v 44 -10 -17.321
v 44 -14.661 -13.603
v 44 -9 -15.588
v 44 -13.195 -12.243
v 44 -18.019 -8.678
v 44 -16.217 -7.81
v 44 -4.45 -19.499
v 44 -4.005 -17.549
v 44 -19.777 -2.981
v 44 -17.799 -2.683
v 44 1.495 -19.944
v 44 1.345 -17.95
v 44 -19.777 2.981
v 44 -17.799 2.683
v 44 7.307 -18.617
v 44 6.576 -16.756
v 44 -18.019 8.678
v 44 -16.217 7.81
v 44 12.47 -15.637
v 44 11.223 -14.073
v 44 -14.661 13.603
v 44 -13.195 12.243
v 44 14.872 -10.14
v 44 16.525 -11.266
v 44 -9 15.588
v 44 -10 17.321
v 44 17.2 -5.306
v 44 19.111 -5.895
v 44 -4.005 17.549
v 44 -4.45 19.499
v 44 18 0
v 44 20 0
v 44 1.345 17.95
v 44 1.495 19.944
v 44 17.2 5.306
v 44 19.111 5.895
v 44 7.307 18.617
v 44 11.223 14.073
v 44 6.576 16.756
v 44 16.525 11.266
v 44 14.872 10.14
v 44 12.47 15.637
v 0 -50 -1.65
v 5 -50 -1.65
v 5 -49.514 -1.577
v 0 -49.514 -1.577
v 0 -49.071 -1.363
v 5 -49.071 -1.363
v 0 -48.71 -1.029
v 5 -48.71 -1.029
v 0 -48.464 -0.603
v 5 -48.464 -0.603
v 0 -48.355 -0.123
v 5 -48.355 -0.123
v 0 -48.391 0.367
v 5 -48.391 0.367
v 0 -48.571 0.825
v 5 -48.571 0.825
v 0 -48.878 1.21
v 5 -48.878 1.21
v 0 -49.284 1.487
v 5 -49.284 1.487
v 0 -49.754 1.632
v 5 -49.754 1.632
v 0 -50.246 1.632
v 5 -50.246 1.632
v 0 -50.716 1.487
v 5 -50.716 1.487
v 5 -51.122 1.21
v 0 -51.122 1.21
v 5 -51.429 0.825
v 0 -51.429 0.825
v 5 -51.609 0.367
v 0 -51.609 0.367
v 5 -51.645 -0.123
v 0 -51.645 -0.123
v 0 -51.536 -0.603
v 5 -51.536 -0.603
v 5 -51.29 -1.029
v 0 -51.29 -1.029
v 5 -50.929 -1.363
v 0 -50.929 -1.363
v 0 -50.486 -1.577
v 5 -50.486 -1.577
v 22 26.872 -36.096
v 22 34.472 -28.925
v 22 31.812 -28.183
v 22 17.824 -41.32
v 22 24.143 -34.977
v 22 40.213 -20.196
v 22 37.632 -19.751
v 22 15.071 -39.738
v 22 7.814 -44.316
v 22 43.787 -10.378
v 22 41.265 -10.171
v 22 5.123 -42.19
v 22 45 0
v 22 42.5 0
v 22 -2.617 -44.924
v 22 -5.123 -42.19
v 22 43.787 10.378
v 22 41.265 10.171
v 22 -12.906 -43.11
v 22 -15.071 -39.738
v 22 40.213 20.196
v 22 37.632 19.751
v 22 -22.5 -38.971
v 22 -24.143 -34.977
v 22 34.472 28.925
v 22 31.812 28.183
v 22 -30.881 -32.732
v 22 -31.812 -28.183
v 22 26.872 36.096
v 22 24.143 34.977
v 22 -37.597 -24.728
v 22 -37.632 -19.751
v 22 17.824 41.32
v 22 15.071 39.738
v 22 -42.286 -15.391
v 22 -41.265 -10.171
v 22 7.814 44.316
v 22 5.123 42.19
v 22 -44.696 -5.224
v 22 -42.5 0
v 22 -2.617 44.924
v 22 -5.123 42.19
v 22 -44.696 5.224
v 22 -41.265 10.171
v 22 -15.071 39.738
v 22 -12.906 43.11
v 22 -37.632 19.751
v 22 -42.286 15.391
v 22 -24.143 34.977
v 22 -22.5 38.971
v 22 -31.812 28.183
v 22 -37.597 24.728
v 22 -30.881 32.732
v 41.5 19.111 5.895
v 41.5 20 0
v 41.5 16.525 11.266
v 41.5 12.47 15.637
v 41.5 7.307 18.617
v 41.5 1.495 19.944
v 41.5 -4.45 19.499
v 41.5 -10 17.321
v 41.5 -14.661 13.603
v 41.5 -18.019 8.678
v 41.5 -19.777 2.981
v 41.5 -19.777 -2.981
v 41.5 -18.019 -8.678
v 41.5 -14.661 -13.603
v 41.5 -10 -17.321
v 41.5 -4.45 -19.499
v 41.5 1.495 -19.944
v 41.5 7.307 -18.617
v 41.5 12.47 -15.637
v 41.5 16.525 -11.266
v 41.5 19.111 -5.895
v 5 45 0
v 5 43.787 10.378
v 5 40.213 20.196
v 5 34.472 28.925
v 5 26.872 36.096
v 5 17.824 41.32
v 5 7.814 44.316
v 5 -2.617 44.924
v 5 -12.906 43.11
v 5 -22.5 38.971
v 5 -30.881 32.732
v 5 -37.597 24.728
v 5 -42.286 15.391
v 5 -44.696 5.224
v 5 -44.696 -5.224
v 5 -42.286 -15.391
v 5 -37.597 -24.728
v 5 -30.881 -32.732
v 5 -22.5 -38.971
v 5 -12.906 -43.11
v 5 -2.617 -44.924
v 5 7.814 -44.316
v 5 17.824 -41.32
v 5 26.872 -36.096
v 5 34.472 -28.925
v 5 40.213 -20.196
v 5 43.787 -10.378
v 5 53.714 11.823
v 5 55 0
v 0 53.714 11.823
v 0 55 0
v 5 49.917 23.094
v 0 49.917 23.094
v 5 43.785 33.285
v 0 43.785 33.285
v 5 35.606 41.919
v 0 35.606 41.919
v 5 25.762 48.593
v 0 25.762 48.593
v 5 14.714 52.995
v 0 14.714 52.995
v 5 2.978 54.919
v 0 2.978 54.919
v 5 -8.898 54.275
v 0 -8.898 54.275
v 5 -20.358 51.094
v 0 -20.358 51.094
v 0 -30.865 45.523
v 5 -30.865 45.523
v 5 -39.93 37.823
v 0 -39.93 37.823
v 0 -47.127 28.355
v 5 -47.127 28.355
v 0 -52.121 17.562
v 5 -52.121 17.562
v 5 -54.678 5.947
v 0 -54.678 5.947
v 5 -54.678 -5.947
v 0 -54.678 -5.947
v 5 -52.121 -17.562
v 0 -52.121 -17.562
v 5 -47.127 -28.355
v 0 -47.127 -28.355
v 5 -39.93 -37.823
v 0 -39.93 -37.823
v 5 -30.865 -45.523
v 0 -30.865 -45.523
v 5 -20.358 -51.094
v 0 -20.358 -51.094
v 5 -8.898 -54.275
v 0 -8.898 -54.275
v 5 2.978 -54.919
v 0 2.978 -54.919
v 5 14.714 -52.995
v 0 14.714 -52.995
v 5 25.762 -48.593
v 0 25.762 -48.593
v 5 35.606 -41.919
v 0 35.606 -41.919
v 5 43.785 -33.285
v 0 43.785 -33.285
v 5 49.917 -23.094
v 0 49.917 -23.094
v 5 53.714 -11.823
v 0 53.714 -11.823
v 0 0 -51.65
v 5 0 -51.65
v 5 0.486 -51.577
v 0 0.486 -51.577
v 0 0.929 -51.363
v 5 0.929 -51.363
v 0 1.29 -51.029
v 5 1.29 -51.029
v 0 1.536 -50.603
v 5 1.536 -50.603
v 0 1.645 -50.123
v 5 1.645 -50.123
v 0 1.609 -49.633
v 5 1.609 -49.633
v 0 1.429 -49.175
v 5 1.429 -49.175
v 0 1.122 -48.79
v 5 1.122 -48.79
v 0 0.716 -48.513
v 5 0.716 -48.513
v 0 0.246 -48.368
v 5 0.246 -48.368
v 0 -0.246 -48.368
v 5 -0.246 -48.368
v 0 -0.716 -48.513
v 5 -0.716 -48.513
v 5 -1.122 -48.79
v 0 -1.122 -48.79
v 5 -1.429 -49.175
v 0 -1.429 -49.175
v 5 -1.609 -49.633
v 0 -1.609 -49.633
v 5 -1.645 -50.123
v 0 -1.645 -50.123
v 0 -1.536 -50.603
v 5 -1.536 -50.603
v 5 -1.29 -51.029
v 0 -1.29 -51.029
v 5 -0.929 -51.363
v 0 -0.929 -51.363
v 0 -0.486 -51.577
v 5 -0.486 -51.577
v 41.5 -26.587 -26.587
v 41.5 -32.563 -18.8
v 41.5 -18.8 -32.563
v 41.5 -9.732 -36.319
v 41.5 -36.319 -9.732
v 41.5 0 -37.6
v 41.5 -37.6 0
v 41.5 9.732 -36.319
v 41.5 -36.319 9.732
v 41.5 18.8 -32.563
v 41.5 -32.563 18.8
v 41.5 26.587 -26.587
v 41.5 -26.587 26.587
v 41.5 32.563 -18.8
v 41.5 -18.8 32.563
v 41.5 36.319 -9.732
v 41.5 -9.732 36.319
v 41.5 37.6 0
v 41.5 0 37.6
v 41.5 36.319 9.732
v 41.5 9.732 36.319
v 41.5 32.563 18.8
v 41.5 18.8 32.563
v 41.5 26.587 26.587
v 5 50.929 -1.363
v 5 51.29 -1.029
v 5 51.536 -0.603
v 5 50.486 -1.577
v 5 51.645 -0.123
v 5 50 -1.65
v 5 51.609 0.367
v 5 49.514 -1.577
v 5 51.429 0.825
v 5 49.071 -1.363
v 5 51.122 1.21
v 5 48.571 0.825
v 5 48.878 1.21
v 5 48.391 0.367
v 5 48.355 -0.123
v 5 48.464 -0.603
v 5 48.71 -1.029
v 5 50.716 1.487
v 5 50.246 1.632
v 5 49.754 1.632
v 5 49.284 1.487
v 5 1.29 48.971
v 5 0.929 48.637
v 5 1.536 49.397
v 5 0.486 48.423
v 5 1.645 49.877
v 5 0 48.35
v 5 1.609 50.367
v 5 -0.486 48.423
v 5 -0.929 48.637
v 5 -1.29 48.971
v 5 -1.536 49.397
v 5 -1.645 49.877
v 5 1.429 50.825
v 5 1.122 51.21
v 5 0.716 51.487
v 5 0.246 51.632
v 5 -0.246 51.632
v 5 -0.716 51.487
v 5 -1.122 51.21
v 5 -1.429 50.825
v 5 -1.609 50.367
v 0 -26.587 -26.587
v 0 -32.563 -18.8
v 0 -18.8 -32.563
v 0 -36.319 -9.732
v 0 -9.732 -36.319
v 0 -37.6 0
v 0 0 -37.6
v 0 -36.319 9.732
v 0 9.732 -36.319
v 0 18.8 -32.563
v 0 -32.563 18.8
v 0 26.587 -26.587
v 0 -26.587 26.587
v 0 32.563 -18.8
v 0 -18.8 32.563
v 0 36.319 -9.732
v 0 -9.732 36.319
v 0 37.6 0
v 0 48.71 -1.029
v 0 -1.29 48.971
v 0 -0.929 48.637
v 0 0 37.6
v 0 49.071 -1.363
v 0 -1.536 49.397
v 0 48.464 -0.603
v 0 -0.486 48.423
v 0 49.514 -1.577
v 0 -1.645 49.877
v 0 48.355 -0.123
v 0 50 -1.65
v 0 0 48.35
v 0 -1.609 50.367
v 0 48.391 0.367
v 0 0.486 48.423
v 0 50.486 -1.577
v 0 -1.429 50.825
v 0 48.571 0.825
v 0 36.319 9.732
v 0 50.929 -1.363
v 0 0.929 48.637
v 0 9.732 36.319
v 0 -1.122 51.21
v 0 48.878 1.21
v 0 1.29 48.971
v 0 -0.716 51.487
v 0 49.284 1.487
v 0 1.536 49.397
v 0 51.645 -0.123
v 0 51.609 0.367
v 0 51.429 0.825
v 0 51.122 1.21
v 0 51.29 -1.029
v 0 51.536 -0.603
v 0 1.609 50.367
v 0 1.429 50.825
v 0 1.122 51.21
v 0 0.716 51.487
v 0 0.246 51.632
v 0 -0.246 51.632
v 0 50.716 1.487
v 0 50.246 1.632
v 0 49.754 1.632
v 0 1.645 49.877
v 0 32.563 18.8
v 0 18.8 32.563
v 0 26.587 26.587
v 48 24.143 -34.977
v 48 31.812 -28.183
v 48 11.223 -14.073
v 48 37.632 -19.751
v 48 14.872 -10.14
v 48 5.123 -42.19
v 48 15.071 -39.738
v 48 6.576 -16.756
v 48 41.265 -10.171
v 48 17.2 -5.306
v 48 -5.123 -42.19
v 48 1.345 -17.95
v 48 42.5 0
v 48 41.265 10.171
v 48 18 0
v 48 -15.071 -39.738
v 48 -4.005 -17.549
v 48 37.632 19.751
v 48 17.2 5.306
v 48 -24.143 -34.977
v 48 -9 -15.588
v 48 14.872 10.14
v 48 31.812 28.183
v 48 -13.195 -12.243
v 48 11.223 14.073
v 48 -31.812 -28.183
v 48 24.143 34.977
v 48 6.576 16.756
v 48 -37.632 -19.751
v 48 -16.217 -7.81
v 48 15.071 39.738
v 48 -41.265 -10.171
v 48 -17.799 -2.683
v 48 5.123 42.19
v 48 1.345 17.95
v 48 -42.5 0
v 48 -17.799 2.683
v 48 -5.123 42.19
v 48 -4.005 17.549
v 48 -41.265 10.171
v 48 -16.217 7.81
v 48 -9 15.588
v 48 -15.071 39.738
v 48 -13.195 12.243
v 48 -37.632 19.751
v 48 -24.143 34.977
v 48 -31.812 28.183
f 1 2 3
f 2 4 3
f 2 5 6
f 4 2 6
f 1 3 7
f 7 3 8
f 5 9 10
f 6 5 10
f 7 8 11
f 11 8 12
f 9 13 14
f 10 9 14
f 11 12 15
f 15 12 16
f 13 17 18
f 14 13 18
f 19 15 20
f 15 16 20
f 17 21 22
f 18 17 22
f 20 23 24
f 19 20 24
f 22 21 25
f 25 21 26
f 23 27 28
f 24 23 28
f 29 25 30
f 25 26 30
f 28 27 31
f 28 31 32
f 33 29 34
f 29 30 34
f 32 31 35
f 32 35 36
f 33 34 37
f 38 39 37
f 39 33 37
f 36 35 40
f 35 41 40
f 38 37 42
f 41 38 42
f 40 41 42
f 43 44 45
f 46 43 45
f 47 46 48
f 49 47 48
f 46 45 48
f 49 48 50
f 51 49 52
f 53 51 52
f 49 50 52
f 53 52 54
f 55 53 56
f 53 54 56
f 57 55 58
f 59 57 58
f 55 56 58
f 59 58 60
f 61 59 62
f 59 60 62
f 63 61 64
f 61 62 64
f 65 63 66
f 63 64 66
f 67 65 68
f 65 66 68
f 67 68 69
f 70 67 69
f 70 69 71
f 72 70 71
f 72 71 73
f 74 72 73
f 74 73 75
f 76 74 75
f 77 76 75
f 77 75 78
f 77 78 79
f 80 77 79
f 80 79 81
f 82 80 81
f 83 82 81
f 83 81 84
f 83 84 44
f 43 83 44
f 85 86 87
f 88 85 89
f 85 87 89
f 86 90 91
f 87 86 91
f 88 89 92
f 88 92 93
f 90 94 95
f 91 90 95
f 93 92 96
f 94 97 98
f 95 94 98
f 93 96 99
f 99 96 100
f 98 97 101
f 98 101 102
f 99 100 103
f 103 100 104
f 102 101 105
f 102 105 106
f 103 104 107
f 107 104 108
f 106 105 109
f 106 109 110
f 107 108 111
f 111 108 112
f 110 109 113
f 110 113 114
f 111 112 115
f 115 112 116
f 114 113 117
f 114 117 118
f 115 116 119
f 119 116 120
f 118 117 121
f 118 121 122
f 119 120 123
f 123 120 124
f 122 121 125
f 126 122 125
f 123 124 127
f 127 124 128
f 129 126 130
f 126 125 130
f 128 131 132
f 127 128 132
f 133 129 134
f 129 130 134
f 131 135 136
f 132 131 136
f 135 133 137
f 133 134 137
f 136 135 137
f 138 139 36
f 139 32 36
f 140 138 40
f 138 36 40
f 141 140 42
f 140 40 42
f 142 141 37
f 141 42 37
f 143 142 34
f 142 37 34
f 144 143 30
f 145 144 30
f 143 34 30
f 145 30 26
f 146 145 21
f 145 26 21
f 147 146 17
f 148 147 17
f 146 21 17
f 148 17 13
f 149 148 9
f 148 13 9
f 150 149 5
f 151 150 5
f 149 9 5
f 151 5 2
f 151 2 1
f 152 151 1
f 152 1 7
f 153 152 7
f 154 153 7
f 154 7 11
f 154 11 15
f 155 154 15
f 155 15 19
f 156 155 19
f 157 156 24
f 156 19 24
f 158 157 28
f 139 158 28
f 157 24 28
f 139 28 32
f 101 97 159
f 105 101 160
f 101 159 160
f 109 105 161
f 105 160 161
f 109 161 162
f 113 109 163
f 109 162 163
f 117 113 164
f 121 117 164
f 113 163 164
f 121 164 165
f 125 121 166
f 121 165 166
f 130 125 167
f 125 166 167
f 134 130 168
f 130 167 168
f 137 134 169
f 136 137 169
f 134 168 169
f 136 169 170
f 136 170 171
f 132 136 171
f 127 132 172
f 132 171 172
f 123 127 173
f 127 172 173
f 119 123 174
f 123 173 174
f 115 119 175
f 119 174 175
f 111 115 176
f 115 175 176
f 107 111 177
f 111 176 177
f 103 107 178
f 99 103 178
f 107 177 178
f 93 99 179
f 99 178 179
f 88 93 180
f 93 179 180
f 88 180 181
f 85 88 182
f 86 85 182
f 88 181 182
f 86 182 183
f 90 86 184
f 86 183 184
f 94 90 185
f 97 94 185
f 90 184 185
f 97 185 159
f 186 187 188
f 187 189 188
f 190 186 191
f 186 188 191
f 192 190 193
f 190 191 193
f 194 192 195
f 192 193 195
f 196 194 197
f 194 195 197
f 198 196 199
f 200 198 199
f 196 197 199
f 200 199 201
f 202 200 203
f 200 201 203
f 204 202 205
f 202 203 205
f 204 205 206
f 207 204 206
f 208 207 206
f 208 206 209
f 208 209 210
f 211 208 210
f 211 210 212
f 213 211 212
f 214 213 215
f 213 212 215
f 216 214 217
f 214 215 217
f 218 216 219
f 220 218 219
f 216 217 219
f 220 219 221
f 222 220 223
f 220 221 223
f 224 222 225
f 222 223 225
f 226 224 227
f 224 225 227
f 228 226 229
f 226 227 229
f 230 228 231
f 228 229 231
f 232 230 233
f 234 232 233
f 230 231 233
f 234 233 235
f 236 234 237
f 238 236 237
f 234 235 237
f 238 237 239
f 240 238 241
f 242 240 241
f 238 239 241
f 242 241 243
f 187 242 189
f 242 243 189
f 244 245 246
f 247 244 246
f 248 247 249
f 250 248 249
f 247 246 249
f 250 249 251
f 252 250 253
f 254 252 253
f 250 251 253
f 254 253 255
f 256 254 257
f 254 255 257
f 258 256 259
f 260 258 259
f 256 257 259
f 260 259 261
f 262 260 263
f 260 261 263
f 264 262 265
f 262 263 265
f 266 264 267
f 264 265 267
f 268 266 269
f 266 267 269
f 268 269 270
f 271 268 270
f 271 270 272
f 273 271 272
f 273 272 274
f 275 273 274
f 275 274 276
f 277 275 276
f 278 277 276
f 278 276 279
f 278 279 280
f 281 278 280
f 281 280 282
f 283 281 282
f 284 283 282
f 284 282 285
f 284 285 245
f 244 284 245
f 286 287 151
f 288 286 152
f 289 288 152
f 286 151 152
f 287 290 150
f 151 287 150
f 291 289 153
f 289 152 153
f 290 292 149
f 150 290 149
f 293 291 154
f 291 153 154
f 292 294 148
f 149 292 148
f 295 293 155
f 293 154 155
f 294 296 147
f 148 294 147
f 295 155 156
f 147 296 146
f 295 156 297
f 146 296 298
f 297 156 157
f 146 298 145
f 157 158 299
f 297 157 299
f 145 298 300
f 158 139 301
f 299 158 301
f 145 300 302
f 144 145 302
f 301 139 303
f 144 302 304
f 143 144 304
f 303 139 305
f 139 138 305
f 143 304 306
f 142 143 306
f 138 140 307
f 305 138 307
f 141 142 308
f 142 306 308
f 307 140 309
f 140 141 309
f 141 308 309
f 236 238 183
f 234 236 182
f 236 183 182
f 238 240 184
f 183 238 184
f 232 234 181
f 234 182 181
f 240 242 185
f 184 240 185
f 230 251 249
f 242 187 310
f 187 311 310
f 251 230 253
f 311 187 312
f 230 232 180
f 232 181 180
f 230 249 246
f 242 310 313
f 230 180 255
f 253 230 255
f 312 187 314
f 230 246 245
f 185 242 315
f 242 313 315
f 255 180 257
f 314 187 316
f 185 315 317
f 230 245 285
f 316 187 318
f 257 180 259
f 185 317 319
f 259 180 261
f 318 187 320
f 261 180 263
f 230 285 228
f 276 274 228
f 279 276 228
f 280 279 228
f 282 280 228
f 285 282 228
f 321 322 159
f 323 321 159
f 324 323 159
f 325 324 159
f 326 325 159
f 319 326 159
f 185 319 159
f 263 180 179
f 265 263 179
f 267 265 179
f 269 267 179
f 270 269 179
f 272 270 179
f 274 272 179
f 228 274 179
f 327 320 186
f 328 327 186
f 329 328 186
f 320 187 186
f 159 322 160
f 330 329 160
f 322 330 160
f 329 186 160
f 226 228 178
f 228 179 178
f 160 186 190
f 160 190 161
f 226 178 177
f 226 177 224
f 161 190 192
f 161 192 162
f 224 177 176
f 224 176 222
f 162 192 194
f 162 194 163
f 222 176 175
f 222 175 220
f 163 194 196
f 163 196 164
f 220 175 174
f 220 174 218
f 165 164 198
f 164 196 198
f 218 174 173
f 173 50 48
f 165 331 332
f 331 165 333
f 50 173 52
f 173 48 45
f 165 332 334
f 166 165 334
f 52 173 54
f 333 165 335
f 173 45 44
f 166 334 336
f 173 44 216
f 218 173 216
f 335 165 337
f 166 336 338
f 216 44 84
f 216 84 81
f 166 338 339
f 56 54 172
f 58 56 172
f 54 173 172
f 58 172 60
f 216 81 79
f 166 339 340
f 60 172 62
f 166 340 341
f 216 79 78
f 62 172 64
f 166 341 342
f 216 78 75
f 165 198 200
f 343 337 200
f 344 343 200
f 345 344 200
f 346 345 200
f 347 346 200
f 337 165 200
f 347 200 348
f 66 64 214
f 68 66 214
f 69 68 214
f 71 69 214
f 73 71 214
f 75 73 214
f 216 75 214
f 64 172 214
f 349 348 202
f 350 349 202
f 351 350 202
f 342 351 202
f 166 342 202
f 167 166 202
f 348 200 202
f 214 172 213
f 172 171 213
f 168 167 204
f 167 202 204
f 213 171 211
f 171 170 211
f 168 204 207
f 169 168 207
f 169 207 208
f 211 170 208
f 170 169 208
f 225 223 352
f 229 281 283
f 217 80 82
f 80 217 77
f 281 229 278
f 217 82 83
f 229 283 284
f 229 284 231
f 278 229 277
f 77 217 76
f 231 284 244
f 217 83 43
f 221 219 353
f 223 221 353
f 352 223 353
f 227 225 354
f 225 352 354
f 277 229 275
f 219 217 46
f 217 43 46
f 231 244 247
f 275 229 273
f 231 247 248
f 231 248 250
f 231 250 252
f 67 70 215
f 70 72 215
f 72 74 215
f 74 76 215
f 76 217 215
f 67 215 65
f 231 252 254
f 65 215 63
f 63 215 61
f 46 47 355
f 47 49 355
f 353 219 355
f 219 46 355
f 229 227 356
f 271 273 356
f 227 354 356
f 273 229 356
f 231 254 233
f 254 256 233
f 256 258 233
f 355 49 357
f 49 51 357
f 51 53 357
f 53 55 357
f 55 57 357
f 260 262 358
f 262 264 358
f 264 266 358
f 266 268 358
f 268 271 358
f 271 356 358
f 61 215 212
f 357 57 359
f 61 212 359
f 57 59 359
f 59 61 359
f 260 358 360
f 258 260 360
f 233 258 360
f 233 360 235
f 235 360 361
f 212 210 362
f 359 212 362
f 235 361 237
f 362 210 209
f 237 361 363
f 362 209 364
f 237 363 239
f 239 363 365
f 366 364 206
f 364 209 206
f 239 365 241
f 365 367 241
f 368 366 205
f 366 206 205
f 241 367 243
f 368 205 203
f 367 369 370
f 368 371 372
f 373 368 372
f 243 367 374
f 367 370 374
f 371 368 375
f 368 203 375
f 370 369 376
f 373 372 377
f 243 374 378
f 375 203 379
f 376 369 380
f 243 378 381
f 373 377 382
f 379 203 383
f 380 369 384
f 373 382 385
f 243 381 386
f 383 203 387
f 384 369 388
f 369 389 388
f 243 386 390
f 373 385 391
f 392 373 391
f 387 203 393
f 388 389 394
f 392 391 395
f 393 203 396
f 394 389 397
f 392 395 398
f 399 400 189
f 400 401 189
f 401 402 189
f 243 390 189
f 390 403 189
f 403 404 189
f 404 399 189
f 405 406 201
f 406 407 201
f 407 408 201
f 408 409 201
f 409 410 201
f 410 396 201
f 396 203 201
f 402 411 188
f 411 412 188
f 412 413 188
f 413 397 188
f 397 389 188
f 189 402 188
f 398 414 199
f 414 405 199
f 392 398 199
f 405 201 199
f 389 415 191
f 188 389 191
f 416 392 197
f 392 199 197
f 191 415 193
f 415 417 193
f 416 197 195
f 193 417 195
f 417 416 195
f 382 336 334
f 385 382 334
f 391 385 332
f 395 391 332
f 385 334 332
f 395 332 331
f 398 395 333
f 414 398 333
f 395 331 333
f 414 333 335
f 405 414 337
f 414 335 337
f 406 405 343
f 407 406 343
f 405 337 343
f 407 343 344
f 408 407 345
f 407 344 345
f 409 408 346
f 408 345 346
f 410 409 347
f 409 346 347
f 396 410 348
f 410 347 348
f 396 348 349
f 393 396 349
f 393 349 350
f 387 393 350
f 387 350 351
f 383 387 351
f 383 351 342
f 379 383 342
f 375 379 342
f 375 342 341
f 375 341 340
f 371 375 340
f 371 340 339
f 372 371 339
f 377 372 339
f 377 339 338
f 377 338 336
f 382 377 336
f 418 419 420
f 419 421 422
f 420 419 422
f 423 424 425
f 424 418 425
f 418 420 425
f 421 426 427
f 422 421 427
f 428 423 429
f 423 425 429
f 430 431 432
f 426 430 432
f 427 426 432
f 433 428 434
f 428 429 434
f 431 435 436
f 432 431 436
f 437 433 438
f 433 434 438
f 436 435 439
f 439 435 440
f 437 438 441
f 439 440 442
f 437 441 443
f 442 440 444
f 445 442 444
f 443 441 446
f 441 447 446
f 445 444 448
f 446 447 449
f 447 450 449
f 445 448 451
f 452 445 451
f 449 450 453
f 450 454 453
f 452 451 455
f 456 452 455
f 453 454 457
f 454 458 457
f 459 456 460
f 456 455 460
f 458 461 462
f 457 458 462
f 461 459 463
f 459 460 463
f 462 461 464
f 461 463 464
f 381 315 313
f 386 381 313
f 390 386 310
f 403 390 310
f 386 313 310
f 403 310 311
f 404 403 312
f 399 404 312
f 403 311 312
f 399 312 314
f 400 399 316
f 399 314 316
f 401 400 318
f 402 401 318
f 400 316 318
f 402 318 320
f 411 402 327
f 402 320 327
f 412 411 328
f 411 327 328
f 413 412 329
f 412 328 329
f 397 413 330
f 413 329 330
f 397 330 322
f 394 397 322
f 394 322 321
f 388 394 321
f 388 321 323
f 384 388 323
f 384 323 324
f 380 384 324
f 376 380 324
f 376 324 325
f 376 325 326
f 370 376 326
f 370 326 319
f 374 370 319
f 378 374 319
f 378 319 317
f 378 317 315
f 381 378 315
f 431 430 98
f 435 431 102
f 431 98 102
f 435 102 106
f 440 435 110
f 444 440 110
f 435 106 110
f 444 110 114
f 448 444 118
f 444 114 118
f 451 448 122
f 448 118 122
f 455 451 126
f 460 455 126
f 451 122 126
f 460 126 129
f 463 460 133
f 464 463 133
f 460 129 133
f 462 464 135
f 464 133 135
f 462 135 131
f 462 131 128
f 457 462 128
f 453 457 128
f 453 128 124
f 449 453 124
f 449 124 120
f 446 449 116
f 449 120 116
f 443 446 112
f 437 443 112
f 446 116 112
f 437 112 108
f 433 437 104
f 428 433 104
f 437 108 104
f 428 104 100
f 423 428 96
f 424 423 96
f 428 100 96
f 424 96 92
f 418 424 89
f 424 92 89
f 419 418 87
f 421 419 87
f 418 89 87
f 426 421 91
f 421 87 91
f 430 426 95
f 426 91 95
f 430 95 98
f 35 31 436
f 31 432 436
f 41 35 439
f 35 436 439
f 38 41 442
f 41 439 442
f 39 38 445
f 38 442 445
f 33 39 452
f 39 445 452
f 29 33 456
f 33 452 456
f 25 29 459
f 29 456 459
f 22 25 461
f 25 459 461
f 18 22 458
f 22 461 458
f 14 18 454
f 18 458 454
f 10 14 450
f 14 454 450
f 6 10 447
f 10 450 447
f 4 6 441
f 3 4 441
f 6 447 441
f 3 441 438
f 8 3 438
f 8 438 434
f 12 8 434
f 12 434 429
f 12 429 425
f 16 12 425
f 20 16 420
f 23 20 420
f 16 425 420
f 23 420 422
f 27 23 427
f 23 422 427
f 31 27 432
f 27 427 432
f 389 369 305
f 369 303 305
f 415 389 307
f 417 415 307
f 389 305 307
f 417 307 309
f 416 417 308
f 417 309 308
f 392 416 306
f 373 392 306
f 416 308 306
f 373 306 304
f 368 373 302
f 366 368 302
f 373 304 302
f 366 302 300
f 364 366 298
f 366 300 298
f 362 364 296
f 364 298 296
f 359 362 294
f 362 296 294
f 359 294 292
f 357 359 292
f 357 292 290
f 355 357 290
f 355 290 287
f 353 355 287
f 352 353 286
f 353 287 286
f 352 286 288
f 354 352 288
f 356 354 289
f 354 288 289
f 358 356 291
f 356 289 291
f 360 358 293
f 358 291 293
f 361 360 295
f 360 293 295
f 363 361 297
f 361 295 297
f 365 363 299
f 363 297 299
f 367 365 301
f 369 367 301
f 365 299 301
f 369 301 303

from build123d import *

# Parameters (mm, degrees)
M4X0_7_TAPPED_HOLE1_D = 3.3


with BuildPart() as part:
    # Sketch2 → Revolve1 (revolve)
    with BuildSketch(Plane.XY):
        Polygon((0, 37.6), (41.5, 37.6), (41.5, 20), (44, 20), (44, 18), (48, 18), (48, 42.5), (22, 42.5), (22, 45), (5, 45), (5, 55), (0, 55), (0, 45), align=None)
    revolve(axis=Axis((-64.103352454, 0, 0), (1, 0, 0)))

    # M4x0.7 Tapped Hole1 (through all)
    with Locations(Plane.ZY):
        with Locations((0, 50), (50, 0), (0, -50), (-50, 0)):
            Hole(M4X0_7_TAPPED_HOLE1_D / 2)


solid = part.part
